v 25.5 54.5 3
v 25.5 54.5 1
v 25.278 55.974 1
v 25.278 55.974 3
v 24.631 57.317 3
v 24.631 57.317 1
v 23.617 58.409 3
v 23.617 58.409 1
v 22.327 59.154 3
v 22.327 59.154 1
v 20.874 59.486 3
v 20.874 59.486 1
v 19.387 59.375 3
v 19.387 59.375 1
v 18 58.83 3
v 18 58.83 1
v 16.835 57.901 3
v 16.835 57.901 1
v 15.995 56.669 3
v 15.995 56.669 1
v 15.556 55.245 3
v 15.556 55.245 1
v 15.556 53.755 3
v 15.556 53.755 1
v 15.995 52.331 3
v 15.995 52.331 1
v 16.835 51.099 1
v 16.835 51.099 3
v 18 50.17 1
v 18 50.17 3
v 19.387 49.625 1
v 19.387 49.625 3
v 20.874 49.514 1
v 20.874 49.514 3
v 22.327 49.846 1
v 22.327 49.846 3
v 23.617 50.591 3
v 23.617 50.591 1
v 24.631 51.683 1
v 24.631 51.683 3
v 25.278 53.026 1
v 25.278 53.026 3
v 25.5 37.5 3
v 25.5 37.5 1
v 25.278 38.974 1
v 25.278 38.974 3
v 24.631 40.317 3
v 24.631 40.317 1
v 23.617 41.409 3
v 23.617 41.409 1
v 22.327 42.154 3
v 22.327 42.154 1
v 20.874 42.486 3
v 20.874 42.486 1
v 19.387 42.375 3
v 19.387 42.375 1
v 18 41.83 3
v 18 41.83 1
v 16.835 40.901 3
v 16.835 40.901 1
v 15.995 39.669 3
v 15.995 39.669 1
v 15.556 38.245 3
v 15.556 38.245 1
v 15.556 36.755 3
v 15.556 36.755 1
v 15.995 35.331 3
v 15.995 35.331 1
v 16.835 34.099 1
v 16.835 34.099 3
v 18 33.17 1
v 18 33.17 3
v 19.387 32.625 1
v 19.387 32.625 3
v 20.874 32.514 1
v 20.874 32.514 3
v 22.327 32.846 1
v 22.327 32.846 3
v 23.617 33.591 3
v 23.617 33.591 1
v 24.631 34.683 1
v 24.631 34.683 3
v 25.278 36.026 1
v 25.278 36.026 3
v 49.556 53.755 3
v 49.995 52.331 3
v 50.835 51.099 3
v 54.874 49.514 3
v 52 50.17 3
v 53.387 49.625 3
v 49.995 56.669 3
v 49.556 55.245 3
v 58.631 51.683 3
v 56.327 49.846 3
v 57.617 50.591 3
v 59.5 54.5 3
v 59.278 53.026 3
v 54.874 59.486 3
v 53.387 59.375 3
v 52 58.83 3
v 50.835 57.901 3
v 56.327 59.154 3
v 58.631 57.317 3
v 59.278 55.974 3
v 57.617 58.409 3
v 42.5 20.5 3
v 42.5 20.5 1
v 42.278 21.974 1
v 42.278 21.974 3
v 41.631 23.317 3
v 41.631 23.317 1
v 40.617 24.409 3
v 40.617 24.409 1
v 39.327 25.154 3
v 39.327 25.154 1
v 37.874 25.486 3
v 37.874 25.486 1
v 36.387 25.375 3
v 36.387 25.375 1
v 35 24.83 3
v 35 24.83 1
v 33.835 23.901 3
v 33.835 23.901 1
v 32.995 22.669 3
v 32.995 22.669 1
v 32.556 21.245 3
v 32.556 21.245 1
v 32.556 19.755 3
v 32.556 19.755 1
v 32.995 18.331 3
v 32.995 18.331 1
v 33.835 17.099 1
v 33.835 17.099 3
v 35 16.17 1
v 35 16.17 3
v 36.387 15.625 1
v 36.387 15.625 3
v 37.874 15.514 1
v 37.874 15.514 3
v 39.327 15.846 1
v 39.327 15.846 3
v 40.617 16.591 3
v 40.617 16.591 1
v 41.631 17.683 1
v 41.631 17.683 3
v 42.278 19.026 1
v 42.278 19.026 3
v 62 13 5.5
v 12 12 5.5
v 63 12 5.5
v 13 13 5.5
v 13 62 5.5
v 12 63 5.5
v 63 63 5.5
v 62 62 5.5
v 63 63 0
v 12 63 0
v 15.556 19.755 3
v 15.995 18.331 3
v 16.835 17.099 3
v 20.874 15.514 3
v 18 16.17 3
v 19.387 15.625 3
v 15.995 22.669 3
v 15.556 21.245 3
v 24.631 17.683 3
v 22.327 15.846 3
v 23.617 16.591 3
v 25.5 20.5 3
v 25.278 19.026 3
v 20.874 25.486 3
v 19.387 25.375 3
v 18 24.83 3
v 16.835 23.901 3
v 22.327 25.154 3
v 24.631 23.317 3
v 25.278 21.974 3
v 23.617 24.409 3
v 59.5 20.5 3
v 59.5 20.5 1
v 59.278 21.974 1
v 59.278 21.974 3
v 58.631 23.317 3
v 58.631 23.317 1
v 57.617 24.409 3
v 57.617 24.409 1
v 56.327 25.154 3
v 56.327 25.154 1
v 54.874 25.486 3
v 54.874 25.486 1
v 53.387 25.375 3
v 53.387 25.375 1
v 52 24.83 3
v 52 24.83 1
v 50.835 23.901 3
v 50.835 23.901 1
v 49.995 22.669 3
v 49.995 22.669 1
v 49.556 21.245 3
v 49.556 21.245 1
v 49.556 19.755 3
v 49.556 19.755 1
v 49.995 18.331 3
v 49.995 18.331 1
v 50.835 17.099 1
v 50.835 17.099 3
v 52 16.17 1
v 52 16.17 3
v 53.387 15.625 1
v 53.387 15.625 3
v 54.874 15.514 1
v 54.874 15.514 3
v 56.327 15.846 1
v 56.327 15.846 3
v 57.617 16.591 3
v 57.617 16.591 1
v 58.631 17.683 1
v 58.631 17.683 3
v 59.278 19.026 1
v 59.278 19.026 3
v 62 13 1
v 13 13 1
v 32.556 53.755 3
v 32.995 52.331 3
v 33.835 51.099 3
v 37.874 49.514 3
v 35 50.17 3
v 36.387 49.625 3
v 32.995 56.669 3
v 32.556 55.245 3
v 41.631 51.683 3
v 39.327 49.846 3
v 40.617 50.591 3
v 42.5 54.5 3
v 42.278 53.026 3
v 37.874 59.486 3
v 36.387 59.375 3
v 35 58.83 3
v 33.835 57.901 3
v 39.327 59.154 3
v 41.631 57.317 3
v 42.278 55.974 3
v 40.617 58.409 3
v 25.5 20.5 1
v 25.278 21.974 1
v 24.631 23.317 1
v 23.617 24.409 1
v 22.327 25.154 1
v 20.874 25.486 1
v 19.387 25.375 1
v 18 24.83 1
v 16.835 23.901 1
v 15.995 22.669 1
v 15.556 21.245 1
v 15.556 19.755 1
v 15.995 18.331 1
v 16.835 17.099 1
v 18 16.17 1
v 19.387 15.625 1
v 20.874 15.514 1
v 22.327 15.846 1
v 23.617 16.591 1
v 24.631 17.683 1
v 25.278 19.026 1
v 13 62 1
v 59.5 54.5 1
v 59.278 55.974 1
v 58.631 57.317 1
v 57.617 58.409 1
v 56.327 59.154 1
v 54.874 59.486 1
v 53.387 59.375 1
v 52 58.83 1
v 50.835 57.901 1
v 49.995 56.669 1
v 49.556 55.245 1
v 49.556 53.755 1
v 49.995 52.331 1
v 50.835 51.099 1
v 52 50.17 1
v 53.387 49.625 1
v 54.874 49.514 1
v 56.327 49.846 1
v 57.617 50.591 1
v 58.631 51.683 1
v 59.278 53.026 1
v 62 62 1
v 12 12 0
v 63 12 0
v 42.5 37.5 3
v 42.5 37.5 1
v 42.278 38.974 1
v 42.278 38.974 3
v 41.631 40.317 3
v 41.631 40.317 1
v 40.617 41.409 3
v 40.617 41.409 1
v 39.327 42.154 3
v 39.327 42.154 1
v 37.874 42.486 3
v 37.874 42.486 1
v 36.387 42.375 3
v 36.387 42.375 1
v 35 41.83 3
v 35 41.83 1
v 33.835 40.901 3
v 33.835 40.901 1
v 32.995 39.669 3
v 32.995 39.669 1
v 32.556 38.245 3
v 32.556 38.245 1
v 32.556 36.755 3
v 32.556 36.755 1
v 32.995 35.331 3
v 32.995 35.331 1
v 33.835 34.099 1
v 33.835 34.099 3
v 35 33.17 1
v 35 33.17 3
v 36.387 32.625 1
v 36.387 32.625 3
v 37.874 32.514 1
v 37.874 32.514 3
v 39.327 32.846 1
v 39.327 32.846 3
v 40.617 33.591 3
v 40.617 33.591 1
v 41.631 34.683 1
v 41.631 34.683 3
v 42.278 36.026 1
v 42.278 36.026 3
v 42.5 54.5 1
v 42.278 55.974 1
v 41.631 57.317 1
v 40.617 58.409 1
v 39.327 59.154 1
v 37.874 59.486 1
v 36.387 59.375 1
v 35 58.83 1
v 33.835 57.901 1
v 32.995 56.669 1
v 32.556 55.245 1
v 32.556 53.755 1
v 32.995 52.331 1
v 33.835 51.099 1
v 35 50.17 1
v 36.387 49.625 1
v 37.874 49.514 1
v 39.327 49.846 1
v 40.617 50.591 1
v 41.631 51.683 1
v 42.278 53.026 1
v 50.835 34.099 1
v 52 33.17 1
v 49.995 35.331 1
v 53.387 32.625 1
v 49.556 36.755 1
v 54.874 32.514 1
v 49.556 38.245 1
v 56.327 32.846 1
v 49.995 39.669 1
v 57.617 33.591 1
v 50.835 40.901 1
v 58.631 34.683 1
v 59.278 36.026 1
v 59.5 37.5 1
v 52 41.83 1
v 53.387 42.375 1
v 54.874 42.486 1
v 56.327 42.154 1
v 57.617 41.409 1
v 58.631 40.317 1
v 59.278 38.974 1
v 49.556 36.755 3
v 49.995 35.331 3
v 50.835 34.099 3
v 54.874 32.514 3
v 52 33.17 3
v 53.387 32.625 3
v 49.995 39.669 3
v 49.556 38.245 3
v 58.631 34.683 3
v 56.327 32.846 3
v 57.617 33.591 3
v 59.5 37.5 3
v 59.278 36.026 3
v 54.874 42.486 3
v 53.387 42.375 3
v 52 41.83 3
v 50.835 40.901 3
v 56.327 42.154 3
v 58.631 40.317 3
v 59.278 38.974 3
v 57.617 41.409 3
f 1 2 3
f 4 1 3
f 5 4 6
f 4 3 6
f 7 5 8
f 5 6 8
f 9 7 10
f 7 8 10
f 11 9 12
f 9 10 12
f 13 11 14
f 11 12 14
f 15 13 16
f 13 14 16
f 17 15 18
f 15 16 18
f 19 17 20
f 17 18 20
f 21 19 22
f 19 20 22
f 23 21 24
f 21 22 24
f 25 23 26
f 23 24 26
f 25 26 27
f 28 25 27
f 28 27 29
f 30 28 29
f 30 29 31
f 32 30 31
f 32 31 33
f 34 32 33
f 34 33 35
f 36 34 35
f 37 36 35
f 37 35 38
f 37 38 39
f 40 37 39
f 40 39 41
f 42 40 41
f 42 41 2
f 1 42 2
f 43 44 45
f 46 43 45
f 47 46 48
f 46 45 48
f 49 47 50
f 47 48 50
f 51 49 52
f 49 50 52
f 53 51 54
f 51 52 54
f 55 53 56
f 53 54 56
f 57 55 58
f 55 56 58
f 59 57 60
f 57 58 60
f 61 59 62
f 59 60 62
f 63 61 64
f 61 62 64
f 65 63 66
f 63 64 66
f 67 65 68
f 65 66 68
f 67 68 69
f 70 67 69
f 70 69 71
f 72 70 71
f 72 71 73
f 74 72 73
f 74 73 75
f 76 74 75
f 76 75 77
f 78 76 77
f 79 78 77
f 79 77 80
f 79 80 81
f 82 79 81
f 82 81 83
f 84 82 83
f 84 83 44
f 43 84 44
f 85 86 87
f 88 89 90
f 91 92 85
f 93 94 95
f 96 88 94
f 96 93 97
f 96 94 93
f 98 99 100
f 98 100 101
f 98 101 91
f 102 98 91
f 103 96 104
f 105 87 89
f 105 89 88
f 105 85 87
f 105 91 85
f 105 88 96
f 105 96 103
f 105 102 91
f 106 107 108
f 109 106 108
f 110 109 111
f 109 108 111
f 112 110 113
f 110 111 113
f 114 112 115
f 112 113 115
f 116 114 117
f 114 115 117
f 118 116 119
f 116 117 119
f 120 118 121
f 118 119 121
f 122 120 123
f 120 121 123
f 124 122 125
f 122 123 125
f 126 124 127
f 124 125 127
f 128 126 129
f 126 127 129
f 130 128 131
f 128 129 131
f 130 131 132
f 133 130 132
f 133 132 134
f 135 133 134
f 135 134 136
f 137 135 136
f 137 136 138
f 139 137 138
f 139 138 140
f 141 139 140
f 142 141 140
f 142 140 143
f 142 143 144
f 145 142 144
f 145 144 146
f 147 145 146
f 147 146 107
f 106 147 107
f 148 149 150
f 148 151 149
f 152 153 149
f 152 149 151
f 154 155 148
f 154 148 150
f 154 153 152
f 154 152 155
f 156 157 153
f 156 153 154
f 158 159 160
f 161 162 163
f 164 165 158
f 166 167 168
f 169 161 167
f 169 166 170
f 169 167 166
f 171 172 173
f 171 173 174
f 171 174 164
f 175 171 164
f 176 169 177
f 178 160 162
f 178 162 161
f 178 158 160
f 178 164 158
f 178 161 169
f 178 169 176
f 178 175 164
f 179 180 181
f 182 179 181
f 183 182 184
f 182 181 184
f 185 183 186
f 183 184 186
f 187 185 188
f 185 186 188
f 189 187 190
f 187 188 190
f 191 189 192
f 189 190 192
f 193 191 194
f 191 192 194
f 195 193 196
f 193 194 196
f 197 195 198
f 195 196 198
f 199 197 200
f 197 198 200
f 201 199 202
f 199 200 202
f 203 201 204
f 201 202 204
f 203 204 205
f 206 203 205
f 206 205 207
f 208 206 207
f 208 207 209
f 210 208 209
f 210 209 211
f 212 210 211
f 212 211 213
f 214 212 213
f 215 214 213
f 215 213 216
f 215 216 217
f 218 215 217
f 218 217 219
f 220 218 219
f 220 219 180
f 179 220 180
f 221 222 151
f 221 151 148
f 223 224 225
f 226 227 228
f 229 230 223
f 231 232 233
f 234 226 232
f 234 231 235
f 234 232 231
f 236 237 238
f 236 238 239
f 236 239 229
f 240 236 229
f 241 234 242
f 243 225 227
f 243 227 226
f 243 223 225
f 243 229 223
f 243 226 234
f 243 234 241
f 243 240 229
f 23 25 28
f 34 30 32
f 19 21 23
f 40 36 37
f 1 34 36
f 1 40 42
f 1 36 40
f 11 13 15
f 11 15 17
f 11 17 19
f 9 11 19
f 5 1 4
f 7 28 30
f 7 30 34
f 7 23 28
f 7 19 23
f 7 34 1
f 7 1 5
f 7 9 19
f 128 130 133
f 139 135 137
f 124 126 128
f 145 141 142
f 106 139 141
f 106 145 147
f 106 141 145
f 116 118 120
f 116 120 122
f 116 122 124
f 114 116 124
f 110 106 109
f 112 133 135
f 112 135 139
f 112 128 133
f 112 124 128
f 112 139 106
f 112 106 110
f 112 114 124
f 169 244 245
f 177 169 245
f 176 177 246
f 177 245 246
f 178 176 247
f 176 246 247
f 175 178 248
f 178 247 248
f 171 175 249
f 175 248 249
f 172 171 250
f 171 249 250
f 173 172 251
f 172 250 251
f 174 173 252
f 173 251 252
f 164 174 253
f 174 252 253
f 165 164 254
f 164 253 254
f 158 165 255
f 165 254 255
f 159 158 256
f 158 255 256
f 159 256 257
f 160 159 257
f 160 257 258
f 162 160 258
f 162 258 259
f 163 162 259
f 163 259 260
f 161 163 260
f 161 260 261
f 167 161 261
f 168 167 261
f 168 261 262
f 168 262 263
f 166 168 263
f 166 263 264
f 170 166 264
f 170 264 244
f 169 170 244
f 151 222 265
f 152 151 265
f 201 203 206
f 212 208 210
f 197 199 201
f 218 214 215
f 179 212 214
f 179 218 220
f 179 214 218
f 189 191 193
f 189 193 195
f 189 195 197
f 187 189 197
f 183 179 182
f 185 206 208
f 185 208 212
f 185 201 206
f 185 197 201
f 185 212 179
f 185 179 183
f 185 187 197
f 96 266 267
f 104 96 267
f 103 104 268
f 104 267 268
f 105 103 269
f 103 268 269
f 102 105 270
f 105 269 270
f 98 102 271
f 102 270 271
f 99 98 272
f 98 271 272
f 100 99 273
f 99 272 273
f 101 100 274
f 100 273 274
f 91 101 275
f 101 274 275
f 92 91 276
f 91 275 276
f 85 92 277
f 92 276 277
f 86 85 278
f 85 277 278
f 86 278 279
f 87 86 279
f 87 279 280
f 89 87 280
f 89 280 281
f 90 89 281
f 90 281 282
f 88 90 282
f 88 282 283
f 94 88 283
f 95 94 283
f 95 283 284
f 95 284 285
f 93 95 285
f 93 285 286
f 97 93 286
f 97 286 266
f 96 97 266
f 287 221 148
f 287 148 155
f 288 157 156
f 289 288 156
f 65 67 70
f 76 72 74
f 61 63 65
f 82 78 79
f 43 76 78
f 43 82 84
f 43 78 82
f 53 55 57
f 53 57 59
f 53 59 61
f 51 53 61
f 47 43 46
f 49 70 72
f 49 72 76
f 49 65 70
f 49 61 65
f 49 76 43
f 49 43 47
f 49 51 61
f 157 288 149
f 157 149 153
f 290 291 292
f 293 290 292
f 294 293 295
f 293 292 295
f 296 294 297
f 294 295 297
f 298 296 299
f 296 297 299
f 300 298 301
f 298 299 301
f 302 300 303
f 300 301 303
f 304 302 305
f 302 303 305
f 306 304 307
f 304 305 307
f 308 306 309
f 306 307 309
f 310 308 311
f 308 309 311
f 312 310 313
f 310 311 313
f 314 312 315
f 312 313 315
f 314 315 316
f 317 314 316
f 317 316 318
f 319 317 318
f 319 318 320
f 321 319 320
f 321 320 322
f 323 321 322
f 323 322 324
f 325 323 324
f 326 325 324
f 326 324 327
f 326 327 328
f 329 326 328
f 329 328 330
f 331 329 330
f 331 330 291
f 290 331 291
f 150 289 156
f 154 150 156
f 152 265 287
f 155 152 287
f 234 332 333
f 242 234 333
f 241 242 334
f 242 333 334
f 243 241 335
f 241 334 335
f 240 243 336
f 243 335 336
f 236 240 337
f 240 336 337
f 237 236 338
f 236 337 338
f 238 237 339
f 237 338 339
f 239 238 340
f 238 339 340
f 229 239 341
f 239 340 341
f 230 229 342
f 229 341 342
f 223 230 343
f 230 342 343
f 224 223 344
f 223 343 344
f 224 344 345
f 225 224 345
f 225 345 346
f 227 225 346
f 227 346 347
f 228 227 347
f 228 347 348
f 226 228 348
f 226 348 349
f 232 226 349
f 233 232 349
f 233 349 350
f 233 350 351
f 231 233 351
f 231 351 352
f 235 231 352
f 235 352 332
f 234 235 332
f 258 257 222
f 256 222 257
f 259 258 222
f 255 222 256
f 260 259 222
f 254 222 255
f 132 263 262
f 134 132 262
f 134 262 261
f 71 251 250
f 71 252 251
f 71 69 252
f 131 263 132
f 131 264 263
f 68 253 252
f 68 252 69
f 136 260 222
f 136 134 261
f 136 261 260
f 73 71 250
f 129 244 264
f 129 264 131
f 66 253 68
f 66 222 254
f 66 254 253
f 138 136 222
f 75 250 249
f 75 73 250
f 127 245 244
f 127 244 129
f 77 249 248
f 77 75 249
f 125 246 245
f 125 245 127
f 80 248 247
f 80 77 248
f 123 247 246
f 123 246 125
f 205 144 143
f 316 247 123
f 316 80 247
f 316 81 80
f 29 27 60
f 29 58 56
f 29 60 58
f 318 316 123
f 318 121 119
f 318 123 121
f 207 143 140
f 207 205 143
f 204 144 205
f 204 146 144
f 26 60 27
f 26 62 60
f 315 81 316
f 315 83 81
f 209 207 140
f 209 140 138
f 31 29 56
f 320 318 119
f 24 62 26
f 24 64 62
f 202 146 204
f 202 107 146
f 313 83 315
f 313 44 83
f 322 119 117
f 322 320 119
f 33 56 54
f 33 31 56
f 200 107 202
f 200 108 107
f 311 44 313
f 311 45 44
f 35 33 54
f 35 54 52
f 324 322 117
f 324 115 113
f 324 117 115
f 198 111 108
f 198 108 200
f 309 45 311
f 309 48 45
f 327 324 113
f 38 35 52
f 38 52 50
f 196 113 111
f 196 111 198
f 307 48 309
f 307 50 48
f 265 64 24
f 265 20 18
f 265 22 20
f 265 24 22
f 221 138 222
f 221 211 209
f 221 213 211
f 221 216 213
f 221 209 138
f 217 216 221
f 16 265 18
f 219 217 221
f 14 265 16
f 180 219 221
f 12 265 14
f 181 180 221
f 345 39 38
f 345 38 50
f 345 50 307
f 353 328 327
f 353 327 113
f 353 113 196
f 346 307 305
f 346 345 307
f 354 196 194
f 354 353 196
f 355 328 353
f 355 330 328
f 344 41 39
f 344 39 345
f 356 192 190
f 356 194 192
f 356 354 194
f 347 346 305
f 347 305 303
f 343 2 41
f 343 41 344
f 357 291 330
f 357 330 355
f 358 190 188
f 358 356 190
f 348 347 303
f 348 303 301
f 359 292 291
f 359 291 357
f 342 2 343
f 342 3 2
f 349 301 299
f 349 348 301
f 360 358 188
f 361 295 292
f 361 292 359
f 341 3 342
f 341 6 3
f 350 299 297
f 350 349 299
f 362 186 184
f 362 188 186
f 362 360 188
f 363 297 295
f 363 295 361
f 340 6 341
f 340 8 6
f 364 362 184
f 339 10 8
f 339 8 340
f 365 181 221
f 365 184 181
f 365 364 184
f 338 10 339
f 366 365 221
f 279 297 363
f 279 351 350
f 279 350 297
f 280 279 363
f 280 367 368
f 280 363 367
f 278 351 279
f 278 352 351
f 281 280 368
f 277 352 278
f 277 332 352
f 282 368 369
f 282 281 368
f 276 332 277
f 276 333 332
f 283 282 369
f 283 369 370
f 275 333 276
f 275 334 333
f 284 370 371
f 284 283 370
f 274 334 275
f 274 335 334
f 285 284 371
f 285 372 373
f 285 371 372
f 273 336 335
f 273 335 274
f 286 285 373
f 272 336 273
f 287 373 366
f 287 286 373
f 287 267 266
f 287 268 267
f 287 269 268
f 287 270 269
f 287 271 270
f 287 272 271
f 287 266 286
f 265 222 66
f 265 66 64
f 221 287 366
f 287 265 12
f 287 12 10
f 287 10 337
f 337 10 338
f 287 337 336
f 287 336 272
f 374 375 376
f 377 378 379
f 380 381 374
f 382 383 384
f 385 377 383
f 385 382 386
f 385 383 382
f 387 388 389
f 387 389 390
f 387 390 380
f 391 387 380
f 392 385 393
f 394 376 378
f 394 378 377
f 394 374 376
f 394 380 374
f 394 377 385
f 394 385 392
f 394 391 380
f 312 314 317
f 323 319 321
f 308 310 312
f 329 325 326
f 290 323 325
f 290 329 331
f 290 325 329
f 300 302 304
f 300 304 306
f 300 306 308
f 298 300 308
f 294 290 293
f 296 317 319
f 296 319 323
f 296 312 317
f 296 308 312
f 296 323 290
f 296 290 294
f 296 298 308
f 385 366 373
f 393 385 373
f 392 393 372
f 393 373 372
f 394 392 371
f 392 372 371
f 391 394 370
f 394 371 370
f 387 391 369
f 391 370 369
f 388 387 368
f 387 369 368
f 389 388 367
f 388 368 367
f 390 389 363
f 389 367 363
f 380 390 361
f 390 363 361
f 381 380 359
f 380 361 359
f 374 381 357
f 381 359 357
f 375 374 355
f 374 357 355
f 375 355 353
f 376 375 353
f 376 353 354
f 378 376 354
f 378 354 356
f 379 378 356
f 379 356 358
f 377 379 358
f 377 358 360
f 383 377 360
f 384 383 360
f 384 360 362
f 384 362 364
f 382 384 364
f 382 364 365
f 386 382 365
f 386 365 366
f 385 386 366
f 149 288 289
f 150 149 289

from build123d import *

# Parameters (mm, degrees)
F0_R     = 5
F1_DEPTH = 3
F0_W     = 49
F0_H     = 49
F2_DEPTH = 1
F0_W_2   = 51
F0_H_2   = 51
F3_DEPTH = 5.5


with BuildPart() as f1:
    # F0 (on Top) → F1 (new body)
    with BuildSketch(Plane.XY):
        with Locations((20.5, 54.5)):
            Circle(F0_R)
    extrude(amount=F1_DEPTH)



with BuildPart() as f1b:
    # F0 (on Top) → F1, piece 2 (new body)
    with BuildSketch(Plane.XY):
        with Locations((37.5, 54.5)):
            Circle(F0_R)
    extrude(amount=F1_DEPTH)


with BuildPart() as f1c:
    # F0 (on Top) → F1, piece 3 (new body)
    with BuildSketch(Plane.XY):
        with Locations((54.5, 54.5)):
            Circle(F0_R)
    extrude(amount=F1_DEPTH)


with BuildPart() as f1d:
    # F0 (on Top) → F1, piece 4 (new body)
    with BuildSketch(Plane.XY):
        with Locations((54.5, 37.5)):
            Circle(F0_R)
    extrude(amount=F1_DEPTH)


with BuildPart() as f1e:
    # F0 (on Top) → F1, piece 5 (new body)
    with BuildSketch(Plane.XY):
        with Locations((37.5, 37.5)):
            Circle(F0_R)
    extrude(amount=F1_DEPTH)


with BuildPart() as f1f:
    # F0 (on Top) → F1, piece 6 (new body)
    with BuildSketch(Plane.XY):
        with Locations((20.5, 37.5)):
            Circle(F0_R)
    extrude(amount=F1_DEPTH)


with BuildPart() as f1g:
    # F0 (on Top) → F1, piece 7 (new body)
    with BuildSketch(Plane.XY):
        with Locations((20.5, 20.5)):
            Circle(F0_R)
    extrude(amount=F1_DEPTH)


with BuildPart() as f1h:
    # F0 (on Top) → F1, piece 8 (new body)
    with BuildSketch(Plane.XY):
        with Locations((37.5, 20.5)):
            Circle(F0_R)
    extrude(amount=F1_DEPTH)


with BuildPart() as f1i:
    # F0 (on Top) → F1, piece 9 (new body)
    with BuildSketch(Plane.XY):
        with Locations((54.5, 20.5)):
            Circle(F0_R)
    extrude(amount=F1_DEPTH)


with BuildPart() as f1_1:
    add(f1.part)

    add(f1b.part)  # F2 merges F1b

    add(f1c.part)  # F2 merges F1c

    add(f1d.part)  # F2 merges F1d

    add(f1e.part)  # F2 merges F1e

    add(f1f.part)  # F2 merges F1f

    add(f1g.part)  # F2 merges F1g

    add(f1h.part)  # F2 merges F1h

    add(f1i.part)  # F2 merges F1i
    # F0 (on Top) → F2 (join)
    with BuildSketch(Plane.XY):
        with Locations((37.5, 37.5)):
            Rectangle(F0_W, F0_H)
        with Locations((20.5, 20.5)):
            Circle(F0_R, mode=Mode.SUBTRACT)
        with Locations((37.5, 20.5)):
            Circle(F0_R, mode=Mode.SUBTRACT)
        with Locations((54.5, 20.5)):
            Circle(F0_R, mode=Mode.SUBTRACT)
        with Locations((20.5, 37.5)):
            Circle(F0_R, mode=Mode.SUBTRACT)
        with Locations((20.5, 54.5)):
            Circle(F0_R, mode=Mode.SUBTRACT)
        with Locations((37.5, 37.5)):
            Circle(F0_R, mode=Mode.SUBTRACT)
        with Locations((54.5, 37.5)):
            Circle(F0_R, mode=Mode.SUBTRACT)
        with Locations((37.5, 54.5)):
            Circle(F0_R, mode=Mode.SUBTRACT)
        with Locations((54.5, 54.5)):
            Circle(F0_R, mode=Mode.SUBTRACT)
    extrude(amount=F2_DEPTH)

    # F0 (on Top) → F3 (join)
    with BuildSketch(Plane.XY):
        with Locations((37.5, 37.5)):
            Rectangle(F0_W_2, F0_H_2)
        with Locations((37.5, 37.5)):
            Rectangle(F0_W, F0_H, mode=Mode.SUBTRACT)
    extrude(amount=F3_DEPTH)


solid = f1_1.part
